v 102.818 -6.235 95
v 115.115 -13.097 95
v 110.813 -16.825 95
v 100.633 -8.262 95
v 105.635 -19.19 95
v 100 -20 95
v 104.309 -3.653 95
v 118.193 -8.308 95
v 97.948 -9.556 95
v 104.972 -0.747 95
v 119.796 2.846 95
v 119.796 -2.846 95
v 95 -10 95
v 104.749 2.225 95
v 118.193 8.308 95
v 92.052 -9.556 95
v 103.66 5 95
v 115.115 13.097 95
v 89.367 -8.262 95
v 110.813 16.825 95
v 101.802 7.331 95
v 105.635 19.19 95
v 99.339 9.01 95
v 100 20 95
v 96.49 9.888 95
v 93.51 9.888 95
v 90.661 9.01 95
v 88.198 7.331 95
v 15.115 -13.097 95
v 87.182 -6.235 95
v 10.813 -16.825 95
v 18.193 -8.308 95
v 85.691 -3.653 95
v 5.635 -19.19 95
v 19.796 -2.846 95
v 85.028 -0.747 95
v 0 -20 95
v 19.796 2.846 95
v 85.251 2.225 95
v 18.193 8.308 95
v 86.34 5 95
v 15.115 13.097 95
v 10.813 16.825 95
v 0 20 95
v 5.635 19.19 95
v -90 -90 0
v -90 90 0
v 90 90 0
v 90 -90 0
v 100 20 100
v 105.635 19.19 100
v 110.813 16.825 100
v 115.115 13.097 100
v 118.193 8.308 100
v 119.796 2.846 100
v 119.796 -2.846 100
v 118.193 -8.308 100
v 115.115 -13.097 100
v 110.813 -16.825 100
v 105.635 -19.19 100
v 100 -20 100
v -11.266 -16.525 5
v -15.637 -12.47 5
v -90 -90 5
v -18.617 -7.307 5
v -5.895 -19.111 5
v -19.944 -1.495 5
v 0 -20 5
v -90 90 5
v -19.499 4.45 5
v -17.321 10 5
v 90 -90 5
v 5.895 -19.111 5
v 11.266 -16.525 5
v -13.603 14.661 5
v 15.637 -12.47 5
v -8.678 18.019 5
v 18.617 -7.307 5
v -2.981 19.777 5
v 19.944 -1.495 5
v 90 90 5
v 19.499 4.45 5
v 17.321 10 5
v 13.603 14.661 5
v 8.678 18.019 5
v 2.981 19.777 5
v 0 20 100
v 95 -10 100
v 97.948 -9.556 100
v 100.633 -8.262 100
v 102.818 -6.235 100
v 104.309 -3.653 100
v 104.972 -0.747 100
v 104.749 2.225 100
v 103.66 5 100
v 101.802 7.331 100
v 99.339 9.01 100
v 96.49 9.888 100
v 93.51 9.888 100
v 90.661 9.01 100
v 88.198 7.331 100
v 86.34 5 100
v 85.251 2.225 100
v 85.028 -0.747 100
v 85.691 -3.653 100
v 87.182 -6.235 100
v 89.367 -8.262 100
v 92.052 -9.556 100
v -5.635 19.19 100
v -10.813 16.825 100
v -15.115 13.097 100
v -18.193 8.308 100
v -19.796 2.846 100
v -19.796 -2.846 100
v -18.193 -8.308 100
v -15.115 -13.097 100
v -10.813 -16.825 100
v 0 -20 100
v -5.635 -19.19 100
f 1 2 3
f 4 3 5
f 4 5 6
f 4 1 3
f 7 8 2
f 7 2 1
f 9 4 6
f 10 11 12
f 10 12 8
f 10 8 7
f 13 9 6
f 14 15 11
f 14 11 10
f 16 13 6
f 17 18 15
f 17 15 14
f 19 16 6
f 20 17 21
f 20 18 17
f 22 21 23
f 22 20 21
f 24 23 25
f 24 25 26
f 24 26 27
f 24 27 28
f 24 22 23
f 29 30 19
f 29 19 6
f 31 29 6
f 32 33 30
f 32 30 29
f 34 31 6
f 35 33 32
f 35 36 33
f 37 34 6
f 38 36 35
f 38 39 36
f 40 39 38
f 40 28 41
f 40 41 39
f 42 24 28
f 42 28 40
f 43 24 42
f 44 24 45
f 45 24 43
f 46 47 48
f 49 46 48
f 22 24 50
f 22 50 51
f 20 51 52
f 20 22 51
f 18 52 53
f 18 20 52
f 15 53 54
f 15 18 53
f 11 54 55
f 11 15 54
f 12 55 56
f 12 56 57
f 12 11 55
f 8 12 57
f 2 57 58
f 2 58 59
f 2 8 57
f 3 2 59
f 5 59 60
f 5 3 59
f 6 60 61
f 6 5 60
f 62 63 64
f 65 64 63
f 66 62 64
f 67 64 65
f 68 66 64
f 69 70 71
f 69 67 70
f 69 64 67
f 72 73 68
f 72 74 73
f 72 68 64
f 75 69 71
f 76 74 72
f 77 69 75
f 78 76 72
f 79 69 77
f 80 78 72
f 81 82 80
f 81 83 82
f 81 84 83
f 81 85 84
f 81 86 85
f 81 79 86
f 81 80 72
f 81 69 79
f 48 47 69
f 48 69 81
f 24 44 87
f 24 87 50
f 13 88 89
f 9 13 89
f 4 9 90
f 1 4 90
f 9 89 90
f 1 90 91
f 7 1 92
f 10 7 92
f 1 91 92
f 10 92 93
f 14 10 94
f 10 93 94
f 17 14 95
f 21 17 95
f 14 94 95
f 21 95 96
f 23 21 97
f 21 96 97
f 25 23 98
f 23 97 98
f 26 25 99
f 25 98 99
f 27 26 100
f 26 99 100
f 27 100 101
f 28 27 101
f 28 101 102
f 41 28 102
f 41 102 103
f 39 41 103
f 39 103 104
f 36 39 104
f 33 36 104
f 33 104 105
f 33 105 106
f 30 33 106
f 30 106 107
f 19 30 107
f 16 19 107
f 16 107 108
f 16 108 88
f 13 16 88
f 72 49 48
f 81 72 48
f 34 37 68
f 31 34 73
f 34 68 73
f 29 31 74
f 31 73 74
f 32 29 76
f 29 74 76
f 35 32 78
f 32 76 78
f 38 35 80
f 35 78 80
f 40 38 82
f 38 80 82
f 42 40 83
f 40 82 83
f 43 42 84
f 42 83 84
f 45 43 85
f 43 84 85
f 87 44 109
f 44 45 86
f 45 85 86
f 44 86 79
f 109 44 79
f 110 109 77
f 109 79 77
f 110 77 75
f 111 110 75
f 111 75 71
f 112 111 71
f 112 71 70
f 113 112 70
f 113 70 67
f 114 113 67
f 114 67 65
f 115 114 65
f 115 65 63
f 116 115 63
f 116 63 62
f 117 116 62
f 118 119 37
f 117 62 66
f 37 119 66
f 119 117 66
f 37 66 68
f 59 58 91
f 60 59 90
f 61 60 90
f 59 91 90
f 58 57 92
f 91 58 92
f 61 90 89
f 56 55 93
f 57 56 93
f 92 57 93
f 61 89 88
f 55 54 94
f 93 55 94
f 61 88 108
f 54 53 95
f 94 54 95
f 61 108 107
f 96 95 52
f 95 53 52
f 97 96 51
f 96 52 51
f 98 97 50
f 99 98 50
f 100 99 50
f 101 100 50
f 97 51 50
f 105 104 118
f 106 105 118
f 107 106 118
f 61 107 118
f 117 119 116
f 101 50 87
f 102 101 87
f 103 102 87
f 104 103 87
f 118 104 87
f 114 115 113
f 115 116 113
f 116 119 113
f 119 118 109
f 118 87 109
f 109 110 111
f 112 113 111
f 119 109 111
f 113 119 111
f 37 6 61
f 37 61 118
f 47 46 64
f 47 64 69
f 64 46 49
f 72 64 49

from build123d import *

# Parameters (mm, degrees)
SKETCH1_W             = 180
SKETCH1_H             = 180
BOSS_EXTRUDE1_DEPTH   = 5
SKETCH2_R             = 20
BOSS_EXTRUDE2_DEPTH   = 95
BOSS_EXTRUDE3_START   = -5
BOSS_EXTRUDE3_DEPTH   = 5
CUT_EXTRUDE1_REACH    = 182.278
SKETCH4_R             = 10
BODY_MOVE_COPY1_ANGLE = 90


with BuildPart() as part:
    # Sketch1 → Boss-Extrude1 (new body)
    with BuildSketch(Plane(origin=(0, 0, 0), x_dir=(1, 0, 0), z_dir=(0, 1, 0))):
        Rectangle(SKETCH1_W, SKETCH1_H)
    extrude(amount=BOSS_EXTRUDE1_DEPTH)

    # Sketch2 → Boss-Extrude2 (add)
    with BuildSketch(Plane(origin=(0, 5, 0), x_dir=(1, 0, 0), z_dir=(0, 1, 0))):
        with Locations(Location((0, 0, 0), (0, 0, 270))):
            Circle(SKETCH2_R)
    extrude(amount=BOSS_EXTRUDE2_DEPTH)

    # Sketch3 → Boss-Extrude3 (add)
    with BuildSketch(Plane(origin=(0, 100, 0), x_dir=(1, 0, 0), z_dir=(0, 1, 0)).offset(BOSS_EXTRUDE3_START)):
        with BuildLine():
            Line((0, 20), (100, 20))
            ThreePointArc((100, 20), (120, 0), (100, -20))
            Line((100, -20), (0, -20))
            ThreePointArc((0, -20), (-20, 0), (0, 20))
        make_face()
    extrude(amount=BOSS_EXTRUDE3_DEPTH)

    # Sketch4 → Cut-Extrude1 (cut, up to next)
    with BuildSketch(Plane(origin=(0, 100, 0), x_dir=(1, 0, 0), z_dir=(0, 1, 0)), mode=Mode.PRIVATE) as cut_extrude1_sk1:
        with Locations(Location((95, 0, 0), (0, 0, 270))):
            Circle(SKETCH4_R)
    cut_extrude1_tool1 = extrude(cut_extrude1_sk1.sketch, amount=-CUT_EXTRUDE1_REACH, mode=Mode.PRIVATE) & part.part
    add(cut_extrude1_tool1.solids().sort_by_distance((95, 100, 0))[0], mode=Mode.SUBTRACT)


with BuildPart() as part_1:
    # Body-Move/Copy1: moved
    add(part.part.rotate(Axis((0, 0, 0), (1, 0, 0)), BODY_MOVE_COPY1_ANGLE))


solid = part_1.part
